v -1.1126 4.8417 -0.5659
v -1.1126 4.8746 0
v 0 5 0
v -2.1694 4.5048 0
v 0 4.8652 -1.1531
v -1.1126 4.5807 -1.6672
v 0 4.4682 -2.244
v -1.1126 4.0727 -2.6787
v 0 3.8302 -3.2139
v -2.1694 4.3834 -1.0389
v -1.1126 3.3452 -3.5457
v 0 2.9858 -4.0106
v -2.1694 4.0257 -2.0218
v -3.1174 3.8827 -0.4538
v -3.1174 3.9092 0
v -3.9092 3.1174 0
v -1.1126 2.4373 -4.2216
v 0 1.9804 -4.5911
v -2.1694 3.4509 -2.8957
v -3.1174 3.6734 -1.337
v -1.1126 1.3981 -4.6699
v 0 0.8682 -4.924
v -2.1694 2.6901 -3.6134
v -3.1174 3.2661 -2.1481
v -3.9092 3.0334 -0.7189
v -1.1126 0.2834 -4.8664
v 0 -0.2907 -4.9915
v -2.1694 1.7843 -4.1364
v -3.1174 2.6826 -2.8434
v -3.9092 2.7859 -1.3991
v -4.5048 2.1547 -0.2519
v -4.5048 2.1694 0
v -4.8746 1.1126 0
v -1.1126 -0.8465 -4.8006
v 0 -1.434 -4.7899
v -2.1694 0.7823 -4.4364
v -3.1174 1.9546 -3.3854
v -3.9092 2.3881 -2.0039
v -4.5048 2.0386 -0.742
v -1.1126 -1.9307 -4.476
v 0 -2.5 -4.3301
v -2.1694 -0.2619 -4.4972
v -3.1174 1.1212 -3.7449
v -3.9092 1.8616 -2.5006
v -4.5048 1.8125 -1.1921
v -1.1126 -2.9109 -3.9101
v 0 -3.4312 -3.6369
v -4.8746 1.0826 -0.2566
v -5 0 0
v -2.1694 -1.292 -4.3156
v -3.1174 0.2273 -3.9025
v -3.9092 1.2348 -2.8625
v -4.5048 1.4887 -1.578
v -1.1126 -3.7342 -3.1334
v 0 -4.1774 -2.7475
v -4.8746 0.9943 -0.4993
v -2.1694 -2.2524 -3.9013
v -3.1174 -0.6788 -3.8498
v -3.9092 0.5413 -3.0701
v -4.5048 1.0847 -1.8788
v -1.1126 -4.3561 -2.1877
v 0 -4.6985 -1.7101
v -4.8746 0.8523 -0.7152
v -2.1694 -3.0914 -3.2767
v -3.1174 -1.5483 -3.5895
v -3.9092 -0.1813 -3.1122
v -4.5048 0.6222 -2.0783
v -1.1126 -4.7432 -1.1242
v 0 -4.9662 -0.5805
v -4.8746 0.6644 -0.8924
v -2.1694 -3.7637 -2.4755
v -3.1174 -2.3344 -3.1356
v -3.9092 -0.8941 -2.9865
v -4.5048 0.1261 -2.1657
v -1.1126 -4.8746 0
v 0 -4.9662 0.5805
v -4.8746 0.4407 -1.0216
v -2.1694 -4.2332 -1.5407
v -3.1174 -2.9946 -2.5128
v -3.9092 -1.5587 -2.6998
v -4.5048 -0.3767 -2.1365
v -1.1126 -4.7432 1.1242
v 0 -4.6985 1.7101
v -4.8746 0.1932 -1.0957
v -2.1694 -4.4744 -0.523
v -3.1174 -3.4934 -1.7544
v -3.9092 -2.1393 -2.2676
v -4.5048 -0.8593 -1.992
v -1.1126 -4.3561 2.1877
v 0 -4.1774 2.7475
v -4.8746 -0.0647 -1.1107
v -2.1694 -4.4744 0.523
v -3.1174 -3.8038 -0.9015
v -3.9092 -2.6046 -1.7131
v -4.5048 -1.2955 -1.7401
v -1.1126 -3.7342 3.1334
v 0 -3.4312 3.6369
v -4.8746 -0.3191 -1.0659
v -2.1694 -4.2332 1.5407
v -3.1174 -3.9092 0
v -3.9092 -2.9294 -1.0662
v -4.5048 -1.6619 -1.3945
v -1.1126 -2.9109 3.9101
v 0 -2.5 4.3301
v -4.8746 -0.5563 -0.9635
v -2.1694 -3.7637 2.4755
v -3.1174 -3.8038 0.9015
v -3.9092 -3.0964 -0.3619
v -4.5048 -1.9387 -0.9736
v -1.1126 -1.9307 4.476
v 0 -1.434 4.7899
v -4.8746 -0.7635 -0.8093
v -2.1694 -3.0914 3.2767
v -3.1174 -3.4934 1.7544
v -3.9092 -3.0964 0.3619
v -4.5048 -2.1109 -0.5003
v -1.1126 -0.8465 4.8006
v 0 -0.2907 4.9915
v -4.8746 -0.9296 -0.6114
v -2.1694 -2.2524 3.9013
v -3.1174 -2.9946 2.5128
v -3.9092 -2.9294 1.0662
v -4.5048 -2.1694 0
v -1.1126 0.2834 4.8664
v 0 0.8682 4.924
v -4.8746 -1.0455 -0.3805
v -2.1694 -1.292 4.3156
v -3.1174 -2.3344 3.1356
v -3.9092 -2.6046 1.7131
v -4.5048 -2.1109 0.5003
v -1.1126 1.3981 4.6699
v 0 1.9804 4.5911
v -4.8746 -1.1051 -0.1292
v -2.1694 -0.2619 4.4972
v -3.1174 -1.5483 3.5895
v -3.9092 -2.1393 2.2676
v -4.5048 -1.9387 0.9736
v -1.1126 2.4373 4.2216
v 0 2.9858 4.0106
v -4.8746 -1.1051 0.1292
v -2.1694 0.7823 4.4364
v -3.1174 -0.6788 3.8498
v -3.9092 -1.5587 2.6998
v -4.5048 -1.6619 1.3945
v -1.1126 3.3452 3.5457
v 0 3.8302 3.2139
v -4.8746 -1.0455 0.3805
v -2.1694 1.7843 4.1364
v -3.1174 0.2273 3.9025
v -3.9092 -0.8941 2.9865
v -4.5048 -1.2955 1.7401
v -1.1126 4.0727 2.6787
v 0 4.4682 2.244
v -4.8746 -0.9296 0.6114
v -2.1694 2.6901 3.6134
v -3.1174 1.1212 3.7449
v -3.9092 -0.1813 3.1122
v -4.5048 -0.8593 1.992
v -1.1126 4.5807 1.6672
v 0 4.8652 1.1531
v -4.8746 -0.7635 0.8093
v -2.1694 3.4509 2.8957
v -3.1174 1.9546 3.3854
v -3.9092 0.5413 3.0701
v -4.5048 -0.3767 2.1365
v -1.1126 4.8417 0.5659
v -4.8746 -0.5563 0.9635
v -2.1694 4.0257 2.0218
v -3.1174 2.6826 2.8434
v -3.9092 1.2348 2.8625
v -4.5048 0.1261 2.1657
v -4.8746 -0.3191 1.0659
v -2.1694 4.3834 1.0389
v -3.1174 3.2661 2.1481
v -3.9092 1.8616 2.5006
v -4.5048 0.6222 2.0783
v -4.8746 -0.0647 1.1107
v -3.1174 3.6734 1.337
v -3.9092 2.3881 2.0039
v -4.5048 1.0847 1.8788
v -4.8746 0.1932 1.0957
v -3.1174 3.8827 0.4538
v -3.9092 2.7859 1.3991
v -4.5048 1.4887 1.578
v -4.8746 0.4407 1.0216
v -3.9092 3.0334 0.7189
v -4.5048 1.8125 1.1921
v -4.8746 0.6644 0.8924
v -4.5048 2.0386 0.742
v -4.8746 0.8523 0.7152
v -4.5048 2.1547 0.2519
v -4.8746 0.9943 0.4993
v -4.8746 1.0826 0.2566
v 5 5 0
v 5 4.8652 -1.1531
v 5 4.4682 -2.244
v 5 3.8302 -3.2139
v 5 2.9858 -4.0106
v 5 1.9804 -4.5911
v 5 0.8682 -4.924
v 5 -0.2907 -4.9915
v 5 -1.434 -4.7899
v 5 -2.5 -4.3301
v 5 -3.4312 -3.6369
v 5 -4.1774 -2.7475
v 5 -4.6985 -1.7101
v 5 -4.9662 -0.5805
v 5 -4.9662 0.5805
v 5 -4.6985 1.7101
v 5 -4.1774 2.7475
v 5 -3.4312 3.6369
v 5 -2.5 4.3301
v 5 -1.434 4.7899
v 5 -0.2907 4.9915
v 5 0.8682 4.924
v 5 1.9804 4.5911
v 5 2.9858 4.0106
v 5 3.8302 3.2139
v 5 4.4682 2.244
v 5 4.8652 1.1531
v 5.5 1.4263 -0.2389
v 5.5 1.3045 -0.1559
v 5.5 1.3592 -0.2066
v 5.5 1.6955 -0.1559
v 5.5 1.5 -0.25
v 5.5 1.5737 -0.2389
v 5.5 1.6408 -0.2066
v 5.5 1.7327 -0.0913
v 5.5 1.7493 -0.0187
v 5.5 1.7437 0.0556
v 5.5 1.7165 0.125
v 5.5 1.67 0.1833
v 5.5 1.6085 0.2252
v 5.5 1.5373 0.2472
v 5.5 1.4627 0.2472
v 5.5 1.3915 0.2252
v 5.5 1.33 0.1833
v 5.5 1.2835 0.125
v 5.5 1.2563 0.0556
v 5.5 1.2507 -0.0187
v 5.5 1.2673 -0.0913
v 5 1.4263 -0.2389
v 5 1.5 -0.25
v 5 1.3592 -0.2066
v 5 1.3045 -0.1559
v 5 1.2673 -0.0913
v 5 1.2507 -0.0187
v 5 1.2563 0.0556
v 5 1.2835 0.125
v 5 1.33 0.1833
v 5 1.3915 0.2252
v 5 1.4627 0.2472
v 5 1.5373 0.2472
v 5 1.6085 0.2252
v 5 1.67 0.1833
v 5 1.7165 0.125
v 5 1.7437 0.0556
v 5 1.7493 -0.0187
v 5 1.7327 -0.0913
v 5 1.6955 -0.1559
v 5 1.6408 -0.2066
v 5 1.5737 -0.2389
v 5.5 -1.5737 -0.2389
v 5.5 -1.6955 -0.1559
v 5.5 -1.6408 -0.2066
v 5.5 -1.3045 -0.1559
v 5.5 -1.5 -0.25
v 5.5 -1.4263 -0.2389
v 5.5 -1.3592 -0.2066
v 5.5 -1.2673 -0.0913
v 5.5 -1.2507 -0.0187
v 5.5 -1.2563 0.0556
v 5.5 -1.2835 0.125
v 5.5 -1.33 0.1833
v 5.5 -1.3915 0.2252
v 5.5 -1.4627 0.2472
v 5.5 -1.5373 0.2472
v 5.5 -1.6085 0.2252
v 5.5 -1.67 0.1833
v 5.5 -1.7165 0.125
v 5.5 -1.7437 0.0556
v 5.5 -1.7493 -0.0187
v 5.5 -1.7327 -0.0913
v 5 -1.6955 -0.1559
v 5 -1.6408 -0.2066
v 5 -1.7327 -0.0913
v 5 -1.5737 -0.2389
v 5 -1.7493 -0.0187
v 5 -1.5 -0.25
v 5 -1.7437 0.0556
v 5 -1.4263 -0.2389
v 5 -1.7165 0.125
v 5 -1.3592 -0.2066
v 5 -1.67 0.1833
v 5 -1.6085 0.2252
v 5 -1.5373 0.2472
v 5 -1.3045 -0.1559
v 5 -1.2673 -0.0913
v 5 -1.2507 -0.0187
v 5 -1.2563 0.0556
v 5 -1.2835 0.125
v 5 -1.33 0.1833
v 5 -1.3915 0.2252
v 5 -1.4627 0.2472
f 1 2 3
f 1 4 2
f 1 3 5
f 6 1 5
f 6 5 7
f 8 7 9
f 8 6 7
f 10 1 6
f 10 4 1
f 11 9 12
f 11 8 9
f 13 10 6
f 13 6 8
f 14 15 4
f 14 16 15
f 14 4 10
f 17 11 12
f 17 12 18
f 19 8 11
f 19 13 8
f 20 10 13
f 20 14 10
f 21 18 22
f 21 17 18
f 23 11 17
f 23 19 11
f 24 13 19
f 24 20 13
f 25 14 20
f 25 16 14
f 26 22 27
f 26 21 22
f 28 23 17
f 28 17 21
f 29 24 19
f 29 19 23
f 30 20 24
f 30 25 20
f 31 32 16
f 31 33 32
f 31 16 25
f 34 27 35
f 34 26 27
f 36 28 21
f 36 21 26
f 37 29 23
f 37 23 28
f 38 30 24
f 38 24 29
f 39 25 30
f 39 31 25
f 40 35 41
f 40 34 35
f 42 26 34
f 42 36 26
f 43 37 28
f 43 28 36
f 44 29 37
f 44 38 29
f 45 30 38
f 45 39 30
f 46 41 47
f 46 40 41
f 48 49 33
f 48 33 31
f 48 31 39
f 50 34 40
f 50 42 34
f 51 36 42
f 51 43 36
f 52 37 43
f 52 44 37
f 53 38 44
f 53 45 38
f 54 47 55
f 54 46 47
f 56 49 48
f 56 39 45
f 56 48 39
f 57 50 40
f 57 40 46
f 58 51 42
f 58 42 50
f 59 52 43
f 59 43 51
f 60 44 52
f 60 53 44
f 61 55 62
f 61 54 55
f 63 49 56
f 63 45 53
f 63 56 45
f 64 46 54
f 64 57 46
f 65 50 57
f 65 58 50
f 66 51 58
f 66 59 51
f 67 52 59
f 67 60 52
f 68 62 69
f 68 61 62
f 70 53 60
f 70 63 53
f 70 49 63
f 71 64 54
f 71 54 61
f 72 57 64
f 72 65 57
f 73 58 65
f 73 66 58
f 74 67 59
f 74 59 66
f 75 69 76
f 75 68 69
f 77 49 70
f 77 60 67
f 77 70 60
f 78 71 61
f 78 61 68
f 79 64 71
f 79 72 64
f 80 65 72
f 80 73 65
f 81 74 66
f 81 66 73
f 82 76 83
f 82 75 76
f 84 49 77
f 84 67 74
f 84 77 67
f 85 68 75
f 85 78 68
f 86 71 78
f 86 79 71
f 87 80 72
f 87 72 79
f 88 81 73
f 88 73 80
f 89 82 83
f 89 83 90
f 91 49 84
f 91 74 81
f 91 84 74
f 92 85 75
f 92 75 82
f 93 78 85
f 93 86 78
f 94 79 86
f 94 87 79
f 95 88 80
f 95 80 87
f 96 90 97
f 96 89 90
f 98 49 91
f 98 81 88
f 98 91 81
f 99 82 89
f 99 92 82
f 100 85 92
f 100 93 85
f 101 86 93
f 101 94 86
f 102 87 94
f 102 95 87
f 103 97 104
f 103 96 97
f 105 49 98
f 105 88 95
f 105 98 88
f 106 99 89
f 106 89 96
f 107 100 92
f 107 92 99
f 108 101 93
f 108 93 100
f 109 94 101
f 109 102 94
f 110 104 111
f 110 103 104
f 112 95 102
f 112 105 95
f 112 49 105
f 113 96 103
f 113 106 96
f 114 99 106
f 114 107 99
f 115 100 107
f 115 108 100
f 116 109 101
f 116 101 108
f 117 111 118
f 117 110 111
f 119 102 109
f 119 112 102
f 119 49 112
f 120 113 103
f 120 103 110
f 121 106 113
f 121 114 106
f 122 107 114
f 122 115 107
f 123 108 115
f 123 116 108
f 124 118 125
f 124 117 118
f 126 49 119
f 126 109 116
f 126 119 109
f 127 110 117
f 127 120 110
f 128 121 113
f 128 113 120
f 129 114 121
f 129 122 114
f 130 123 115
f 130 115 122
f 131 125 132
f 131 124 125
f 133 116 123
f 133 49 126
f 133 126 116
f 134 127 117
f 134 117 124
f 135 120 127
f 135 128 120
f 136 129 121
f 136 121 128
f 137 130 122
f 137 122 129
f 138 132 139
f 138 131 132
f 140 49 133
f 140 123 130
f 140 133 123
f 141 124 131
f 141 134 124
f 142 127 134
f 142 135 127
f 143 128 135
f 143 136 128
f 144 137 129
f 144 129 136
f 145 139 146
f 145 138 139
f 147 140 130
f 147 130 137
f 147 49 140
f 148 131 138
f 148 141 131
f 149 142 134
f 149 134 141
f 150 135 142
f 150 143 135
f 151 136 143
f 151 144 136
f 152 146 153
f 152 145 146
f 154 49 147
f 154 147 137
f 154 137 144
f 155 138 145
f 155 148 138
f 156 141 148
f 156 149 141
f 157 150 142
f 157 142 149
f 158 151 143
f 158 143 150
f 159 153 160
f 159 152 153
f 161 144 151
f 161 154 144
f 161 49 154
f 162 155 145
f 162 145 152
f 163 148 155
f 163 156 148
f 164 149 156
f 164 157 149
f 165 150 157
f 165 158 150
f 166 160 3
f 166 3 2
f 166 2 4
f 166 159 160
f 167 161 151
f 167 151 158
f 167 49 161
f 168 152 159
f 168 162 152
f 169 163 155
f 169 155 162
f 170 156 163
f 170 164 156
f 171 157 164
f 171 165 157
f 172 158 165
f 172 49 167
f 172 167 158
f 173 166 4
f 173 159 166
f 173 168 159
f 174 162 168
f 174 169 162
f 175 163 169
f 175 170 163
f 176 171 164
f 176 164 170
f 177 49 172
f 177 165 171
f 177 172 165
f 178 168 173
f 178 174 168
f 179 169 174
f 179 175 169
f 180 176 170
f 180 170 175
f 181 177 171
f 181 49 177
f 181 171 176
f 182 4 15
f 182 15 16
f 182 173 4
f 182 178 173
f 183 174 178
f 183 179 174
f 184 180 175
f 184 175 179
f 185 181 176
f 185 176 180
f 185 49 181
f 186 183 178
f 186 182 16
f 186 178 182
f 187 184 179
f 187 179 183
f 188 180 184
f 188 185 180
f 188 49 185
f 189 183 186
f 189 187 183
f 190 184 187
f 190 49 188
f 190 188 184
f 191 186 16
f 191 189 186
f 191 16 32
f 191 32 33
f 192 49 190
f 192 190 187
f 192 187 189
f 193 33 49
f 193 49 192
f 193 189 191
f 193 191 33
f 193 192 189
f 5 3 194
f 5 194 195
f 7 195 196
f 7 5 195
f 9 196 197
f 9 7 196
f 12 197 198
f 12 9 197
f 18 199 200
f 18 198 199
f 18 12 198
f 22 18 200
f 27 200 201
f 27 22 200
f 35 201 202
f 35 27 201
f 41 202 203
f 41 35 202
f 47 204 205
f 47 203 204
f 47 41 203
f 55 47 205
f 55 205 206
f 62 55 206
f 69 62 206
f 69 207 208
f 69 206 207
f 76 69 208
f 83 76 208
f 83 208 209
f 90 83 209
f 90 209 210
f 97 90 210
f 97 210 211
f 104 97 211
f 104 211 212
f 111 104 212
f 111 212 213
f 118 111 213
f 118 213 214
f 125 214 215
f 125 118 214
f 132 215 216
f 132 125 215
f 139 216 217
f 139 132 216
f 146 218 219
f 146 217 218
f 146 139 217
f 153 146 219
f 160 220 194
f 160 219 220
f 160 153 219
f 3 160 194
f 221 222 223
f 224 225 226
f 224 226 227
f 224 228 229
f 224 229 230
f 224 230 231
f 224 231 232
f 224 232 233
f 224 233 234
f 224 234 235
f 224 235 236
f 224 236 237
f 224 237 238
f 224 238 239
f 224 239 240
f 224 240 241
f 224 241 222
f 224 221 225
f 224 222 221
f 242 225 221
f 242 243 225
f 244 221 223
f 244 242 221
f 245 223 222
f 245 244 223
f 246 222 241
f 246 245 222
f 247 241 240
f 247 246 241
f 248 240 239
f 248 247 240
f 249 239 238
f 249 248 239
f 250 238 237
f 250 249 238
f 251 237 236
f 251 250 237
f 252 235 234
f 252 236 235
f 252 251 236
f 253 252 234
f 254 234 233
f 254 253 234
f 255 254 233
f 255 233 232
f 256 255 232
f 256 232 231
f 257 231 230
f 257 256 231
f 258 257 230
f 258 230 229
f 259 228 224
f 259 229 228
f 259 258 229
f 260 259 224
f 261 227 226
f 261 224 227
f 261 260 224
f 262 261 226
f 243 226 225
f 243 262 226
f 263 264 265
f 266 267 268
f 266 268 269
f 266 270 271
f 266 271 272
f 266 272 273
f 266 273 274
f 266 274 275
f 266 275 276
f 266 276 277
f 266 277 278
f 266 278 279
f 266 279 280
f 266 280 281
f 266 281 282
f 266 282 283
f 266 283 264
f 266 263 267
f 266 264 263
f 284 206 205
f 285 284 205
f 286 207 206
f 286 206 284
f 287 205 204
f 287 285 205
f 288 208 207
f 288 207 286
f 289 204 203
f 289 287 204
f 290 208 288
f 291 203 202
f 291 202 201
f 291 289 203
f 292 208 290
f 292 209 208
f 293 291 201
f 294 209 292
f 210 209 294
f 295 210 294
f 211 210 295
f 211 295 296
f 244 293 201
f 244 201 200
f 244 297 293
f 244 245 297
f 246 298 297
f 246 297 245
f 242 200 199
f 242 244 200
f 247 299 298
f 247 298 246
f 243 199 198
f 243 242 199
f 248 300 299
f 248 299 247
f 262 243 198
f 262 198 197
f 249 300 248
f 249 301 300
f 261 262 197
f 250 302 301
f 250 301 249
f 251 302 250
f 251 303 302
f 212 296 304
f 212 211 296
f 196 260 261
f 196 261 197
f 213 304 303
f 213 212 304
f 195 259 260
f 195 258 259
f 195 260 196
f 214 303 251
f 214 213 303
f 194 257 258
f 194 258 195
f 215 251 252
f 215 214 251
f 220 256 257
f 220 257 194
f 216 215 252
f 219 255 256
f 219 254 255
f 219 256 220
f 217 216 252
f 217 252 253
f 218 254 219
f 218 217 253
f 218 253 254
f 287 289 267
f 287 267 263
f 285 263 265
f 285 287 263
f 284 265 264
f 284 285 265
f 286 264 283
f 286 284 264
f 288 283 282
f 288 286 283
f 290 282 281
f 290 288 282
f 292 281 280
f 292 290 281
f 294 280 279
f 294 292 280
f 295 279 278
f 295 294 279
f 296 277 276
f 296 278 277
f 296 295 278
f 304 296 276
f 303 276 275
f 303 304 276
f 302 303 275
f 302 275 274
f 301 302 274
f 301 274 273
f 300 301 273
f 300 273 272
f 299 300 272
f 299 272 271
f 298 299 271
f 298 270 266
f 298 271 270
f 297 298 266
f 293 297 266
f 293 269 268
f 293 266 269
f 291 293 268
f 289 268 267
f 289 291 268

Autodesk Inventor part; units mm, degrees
ref_plane "YZ Plane" through (0, 0, 0) normal (1, 0, 0) x (0, 1, 0)
ref_plane "XZ Plane" through (0, 0, 0) normal (0, 1, 0) x (-1, 0, 0)
ref_plane "XY Plane" through (0, 0, 0) normal (0, 0, 1) x (1, 0, 0)
sketch "Sketch1" plane through (0, 0, 0) normal (0, 0, 1) x (1, 0, 0)
  line L0 (-5, 0) -> (5, 0)
  line L1 (0, -5) -> (5, -5) construction
  line L2 (5, 5) -> (0, 5)
  arc A0 (0, 5) -> (-5, 0) centre (0, 0) ccw
  line L3 (5, 5) -> (5, 0)
  arc A1 (-5, 0) -> (0, -5) centre (0, 0) ccw construction
  line L4 (5, 0) -> (5, -5) construction
  dimension "d0" = 10
  dimension "d1" = 5
revolve "Revolution1" add sketch "Sketch1" angle 360 about axis through (-5, 0, 0) along (1, 0, 0)
sketch "Sketch2" plane through (5, 0, 0) normal (1, 0, 0) x (0, 0, -1)
  circle A0 centre (0, 1.5) radius 0.25
  circle A1 centre (0, -1.5) radius 0.25
  line L0 (0, 1.5) -> (0, -1.5) construction
  point P0 (0, 0)
  point P1 (0, 0)
  dimension "d3" = 3
  dimension "d4" = 0.5
extrude "Extrusion1" add sketch "Sketch2" along normal blind 0.5
properties part number "diffuser"
